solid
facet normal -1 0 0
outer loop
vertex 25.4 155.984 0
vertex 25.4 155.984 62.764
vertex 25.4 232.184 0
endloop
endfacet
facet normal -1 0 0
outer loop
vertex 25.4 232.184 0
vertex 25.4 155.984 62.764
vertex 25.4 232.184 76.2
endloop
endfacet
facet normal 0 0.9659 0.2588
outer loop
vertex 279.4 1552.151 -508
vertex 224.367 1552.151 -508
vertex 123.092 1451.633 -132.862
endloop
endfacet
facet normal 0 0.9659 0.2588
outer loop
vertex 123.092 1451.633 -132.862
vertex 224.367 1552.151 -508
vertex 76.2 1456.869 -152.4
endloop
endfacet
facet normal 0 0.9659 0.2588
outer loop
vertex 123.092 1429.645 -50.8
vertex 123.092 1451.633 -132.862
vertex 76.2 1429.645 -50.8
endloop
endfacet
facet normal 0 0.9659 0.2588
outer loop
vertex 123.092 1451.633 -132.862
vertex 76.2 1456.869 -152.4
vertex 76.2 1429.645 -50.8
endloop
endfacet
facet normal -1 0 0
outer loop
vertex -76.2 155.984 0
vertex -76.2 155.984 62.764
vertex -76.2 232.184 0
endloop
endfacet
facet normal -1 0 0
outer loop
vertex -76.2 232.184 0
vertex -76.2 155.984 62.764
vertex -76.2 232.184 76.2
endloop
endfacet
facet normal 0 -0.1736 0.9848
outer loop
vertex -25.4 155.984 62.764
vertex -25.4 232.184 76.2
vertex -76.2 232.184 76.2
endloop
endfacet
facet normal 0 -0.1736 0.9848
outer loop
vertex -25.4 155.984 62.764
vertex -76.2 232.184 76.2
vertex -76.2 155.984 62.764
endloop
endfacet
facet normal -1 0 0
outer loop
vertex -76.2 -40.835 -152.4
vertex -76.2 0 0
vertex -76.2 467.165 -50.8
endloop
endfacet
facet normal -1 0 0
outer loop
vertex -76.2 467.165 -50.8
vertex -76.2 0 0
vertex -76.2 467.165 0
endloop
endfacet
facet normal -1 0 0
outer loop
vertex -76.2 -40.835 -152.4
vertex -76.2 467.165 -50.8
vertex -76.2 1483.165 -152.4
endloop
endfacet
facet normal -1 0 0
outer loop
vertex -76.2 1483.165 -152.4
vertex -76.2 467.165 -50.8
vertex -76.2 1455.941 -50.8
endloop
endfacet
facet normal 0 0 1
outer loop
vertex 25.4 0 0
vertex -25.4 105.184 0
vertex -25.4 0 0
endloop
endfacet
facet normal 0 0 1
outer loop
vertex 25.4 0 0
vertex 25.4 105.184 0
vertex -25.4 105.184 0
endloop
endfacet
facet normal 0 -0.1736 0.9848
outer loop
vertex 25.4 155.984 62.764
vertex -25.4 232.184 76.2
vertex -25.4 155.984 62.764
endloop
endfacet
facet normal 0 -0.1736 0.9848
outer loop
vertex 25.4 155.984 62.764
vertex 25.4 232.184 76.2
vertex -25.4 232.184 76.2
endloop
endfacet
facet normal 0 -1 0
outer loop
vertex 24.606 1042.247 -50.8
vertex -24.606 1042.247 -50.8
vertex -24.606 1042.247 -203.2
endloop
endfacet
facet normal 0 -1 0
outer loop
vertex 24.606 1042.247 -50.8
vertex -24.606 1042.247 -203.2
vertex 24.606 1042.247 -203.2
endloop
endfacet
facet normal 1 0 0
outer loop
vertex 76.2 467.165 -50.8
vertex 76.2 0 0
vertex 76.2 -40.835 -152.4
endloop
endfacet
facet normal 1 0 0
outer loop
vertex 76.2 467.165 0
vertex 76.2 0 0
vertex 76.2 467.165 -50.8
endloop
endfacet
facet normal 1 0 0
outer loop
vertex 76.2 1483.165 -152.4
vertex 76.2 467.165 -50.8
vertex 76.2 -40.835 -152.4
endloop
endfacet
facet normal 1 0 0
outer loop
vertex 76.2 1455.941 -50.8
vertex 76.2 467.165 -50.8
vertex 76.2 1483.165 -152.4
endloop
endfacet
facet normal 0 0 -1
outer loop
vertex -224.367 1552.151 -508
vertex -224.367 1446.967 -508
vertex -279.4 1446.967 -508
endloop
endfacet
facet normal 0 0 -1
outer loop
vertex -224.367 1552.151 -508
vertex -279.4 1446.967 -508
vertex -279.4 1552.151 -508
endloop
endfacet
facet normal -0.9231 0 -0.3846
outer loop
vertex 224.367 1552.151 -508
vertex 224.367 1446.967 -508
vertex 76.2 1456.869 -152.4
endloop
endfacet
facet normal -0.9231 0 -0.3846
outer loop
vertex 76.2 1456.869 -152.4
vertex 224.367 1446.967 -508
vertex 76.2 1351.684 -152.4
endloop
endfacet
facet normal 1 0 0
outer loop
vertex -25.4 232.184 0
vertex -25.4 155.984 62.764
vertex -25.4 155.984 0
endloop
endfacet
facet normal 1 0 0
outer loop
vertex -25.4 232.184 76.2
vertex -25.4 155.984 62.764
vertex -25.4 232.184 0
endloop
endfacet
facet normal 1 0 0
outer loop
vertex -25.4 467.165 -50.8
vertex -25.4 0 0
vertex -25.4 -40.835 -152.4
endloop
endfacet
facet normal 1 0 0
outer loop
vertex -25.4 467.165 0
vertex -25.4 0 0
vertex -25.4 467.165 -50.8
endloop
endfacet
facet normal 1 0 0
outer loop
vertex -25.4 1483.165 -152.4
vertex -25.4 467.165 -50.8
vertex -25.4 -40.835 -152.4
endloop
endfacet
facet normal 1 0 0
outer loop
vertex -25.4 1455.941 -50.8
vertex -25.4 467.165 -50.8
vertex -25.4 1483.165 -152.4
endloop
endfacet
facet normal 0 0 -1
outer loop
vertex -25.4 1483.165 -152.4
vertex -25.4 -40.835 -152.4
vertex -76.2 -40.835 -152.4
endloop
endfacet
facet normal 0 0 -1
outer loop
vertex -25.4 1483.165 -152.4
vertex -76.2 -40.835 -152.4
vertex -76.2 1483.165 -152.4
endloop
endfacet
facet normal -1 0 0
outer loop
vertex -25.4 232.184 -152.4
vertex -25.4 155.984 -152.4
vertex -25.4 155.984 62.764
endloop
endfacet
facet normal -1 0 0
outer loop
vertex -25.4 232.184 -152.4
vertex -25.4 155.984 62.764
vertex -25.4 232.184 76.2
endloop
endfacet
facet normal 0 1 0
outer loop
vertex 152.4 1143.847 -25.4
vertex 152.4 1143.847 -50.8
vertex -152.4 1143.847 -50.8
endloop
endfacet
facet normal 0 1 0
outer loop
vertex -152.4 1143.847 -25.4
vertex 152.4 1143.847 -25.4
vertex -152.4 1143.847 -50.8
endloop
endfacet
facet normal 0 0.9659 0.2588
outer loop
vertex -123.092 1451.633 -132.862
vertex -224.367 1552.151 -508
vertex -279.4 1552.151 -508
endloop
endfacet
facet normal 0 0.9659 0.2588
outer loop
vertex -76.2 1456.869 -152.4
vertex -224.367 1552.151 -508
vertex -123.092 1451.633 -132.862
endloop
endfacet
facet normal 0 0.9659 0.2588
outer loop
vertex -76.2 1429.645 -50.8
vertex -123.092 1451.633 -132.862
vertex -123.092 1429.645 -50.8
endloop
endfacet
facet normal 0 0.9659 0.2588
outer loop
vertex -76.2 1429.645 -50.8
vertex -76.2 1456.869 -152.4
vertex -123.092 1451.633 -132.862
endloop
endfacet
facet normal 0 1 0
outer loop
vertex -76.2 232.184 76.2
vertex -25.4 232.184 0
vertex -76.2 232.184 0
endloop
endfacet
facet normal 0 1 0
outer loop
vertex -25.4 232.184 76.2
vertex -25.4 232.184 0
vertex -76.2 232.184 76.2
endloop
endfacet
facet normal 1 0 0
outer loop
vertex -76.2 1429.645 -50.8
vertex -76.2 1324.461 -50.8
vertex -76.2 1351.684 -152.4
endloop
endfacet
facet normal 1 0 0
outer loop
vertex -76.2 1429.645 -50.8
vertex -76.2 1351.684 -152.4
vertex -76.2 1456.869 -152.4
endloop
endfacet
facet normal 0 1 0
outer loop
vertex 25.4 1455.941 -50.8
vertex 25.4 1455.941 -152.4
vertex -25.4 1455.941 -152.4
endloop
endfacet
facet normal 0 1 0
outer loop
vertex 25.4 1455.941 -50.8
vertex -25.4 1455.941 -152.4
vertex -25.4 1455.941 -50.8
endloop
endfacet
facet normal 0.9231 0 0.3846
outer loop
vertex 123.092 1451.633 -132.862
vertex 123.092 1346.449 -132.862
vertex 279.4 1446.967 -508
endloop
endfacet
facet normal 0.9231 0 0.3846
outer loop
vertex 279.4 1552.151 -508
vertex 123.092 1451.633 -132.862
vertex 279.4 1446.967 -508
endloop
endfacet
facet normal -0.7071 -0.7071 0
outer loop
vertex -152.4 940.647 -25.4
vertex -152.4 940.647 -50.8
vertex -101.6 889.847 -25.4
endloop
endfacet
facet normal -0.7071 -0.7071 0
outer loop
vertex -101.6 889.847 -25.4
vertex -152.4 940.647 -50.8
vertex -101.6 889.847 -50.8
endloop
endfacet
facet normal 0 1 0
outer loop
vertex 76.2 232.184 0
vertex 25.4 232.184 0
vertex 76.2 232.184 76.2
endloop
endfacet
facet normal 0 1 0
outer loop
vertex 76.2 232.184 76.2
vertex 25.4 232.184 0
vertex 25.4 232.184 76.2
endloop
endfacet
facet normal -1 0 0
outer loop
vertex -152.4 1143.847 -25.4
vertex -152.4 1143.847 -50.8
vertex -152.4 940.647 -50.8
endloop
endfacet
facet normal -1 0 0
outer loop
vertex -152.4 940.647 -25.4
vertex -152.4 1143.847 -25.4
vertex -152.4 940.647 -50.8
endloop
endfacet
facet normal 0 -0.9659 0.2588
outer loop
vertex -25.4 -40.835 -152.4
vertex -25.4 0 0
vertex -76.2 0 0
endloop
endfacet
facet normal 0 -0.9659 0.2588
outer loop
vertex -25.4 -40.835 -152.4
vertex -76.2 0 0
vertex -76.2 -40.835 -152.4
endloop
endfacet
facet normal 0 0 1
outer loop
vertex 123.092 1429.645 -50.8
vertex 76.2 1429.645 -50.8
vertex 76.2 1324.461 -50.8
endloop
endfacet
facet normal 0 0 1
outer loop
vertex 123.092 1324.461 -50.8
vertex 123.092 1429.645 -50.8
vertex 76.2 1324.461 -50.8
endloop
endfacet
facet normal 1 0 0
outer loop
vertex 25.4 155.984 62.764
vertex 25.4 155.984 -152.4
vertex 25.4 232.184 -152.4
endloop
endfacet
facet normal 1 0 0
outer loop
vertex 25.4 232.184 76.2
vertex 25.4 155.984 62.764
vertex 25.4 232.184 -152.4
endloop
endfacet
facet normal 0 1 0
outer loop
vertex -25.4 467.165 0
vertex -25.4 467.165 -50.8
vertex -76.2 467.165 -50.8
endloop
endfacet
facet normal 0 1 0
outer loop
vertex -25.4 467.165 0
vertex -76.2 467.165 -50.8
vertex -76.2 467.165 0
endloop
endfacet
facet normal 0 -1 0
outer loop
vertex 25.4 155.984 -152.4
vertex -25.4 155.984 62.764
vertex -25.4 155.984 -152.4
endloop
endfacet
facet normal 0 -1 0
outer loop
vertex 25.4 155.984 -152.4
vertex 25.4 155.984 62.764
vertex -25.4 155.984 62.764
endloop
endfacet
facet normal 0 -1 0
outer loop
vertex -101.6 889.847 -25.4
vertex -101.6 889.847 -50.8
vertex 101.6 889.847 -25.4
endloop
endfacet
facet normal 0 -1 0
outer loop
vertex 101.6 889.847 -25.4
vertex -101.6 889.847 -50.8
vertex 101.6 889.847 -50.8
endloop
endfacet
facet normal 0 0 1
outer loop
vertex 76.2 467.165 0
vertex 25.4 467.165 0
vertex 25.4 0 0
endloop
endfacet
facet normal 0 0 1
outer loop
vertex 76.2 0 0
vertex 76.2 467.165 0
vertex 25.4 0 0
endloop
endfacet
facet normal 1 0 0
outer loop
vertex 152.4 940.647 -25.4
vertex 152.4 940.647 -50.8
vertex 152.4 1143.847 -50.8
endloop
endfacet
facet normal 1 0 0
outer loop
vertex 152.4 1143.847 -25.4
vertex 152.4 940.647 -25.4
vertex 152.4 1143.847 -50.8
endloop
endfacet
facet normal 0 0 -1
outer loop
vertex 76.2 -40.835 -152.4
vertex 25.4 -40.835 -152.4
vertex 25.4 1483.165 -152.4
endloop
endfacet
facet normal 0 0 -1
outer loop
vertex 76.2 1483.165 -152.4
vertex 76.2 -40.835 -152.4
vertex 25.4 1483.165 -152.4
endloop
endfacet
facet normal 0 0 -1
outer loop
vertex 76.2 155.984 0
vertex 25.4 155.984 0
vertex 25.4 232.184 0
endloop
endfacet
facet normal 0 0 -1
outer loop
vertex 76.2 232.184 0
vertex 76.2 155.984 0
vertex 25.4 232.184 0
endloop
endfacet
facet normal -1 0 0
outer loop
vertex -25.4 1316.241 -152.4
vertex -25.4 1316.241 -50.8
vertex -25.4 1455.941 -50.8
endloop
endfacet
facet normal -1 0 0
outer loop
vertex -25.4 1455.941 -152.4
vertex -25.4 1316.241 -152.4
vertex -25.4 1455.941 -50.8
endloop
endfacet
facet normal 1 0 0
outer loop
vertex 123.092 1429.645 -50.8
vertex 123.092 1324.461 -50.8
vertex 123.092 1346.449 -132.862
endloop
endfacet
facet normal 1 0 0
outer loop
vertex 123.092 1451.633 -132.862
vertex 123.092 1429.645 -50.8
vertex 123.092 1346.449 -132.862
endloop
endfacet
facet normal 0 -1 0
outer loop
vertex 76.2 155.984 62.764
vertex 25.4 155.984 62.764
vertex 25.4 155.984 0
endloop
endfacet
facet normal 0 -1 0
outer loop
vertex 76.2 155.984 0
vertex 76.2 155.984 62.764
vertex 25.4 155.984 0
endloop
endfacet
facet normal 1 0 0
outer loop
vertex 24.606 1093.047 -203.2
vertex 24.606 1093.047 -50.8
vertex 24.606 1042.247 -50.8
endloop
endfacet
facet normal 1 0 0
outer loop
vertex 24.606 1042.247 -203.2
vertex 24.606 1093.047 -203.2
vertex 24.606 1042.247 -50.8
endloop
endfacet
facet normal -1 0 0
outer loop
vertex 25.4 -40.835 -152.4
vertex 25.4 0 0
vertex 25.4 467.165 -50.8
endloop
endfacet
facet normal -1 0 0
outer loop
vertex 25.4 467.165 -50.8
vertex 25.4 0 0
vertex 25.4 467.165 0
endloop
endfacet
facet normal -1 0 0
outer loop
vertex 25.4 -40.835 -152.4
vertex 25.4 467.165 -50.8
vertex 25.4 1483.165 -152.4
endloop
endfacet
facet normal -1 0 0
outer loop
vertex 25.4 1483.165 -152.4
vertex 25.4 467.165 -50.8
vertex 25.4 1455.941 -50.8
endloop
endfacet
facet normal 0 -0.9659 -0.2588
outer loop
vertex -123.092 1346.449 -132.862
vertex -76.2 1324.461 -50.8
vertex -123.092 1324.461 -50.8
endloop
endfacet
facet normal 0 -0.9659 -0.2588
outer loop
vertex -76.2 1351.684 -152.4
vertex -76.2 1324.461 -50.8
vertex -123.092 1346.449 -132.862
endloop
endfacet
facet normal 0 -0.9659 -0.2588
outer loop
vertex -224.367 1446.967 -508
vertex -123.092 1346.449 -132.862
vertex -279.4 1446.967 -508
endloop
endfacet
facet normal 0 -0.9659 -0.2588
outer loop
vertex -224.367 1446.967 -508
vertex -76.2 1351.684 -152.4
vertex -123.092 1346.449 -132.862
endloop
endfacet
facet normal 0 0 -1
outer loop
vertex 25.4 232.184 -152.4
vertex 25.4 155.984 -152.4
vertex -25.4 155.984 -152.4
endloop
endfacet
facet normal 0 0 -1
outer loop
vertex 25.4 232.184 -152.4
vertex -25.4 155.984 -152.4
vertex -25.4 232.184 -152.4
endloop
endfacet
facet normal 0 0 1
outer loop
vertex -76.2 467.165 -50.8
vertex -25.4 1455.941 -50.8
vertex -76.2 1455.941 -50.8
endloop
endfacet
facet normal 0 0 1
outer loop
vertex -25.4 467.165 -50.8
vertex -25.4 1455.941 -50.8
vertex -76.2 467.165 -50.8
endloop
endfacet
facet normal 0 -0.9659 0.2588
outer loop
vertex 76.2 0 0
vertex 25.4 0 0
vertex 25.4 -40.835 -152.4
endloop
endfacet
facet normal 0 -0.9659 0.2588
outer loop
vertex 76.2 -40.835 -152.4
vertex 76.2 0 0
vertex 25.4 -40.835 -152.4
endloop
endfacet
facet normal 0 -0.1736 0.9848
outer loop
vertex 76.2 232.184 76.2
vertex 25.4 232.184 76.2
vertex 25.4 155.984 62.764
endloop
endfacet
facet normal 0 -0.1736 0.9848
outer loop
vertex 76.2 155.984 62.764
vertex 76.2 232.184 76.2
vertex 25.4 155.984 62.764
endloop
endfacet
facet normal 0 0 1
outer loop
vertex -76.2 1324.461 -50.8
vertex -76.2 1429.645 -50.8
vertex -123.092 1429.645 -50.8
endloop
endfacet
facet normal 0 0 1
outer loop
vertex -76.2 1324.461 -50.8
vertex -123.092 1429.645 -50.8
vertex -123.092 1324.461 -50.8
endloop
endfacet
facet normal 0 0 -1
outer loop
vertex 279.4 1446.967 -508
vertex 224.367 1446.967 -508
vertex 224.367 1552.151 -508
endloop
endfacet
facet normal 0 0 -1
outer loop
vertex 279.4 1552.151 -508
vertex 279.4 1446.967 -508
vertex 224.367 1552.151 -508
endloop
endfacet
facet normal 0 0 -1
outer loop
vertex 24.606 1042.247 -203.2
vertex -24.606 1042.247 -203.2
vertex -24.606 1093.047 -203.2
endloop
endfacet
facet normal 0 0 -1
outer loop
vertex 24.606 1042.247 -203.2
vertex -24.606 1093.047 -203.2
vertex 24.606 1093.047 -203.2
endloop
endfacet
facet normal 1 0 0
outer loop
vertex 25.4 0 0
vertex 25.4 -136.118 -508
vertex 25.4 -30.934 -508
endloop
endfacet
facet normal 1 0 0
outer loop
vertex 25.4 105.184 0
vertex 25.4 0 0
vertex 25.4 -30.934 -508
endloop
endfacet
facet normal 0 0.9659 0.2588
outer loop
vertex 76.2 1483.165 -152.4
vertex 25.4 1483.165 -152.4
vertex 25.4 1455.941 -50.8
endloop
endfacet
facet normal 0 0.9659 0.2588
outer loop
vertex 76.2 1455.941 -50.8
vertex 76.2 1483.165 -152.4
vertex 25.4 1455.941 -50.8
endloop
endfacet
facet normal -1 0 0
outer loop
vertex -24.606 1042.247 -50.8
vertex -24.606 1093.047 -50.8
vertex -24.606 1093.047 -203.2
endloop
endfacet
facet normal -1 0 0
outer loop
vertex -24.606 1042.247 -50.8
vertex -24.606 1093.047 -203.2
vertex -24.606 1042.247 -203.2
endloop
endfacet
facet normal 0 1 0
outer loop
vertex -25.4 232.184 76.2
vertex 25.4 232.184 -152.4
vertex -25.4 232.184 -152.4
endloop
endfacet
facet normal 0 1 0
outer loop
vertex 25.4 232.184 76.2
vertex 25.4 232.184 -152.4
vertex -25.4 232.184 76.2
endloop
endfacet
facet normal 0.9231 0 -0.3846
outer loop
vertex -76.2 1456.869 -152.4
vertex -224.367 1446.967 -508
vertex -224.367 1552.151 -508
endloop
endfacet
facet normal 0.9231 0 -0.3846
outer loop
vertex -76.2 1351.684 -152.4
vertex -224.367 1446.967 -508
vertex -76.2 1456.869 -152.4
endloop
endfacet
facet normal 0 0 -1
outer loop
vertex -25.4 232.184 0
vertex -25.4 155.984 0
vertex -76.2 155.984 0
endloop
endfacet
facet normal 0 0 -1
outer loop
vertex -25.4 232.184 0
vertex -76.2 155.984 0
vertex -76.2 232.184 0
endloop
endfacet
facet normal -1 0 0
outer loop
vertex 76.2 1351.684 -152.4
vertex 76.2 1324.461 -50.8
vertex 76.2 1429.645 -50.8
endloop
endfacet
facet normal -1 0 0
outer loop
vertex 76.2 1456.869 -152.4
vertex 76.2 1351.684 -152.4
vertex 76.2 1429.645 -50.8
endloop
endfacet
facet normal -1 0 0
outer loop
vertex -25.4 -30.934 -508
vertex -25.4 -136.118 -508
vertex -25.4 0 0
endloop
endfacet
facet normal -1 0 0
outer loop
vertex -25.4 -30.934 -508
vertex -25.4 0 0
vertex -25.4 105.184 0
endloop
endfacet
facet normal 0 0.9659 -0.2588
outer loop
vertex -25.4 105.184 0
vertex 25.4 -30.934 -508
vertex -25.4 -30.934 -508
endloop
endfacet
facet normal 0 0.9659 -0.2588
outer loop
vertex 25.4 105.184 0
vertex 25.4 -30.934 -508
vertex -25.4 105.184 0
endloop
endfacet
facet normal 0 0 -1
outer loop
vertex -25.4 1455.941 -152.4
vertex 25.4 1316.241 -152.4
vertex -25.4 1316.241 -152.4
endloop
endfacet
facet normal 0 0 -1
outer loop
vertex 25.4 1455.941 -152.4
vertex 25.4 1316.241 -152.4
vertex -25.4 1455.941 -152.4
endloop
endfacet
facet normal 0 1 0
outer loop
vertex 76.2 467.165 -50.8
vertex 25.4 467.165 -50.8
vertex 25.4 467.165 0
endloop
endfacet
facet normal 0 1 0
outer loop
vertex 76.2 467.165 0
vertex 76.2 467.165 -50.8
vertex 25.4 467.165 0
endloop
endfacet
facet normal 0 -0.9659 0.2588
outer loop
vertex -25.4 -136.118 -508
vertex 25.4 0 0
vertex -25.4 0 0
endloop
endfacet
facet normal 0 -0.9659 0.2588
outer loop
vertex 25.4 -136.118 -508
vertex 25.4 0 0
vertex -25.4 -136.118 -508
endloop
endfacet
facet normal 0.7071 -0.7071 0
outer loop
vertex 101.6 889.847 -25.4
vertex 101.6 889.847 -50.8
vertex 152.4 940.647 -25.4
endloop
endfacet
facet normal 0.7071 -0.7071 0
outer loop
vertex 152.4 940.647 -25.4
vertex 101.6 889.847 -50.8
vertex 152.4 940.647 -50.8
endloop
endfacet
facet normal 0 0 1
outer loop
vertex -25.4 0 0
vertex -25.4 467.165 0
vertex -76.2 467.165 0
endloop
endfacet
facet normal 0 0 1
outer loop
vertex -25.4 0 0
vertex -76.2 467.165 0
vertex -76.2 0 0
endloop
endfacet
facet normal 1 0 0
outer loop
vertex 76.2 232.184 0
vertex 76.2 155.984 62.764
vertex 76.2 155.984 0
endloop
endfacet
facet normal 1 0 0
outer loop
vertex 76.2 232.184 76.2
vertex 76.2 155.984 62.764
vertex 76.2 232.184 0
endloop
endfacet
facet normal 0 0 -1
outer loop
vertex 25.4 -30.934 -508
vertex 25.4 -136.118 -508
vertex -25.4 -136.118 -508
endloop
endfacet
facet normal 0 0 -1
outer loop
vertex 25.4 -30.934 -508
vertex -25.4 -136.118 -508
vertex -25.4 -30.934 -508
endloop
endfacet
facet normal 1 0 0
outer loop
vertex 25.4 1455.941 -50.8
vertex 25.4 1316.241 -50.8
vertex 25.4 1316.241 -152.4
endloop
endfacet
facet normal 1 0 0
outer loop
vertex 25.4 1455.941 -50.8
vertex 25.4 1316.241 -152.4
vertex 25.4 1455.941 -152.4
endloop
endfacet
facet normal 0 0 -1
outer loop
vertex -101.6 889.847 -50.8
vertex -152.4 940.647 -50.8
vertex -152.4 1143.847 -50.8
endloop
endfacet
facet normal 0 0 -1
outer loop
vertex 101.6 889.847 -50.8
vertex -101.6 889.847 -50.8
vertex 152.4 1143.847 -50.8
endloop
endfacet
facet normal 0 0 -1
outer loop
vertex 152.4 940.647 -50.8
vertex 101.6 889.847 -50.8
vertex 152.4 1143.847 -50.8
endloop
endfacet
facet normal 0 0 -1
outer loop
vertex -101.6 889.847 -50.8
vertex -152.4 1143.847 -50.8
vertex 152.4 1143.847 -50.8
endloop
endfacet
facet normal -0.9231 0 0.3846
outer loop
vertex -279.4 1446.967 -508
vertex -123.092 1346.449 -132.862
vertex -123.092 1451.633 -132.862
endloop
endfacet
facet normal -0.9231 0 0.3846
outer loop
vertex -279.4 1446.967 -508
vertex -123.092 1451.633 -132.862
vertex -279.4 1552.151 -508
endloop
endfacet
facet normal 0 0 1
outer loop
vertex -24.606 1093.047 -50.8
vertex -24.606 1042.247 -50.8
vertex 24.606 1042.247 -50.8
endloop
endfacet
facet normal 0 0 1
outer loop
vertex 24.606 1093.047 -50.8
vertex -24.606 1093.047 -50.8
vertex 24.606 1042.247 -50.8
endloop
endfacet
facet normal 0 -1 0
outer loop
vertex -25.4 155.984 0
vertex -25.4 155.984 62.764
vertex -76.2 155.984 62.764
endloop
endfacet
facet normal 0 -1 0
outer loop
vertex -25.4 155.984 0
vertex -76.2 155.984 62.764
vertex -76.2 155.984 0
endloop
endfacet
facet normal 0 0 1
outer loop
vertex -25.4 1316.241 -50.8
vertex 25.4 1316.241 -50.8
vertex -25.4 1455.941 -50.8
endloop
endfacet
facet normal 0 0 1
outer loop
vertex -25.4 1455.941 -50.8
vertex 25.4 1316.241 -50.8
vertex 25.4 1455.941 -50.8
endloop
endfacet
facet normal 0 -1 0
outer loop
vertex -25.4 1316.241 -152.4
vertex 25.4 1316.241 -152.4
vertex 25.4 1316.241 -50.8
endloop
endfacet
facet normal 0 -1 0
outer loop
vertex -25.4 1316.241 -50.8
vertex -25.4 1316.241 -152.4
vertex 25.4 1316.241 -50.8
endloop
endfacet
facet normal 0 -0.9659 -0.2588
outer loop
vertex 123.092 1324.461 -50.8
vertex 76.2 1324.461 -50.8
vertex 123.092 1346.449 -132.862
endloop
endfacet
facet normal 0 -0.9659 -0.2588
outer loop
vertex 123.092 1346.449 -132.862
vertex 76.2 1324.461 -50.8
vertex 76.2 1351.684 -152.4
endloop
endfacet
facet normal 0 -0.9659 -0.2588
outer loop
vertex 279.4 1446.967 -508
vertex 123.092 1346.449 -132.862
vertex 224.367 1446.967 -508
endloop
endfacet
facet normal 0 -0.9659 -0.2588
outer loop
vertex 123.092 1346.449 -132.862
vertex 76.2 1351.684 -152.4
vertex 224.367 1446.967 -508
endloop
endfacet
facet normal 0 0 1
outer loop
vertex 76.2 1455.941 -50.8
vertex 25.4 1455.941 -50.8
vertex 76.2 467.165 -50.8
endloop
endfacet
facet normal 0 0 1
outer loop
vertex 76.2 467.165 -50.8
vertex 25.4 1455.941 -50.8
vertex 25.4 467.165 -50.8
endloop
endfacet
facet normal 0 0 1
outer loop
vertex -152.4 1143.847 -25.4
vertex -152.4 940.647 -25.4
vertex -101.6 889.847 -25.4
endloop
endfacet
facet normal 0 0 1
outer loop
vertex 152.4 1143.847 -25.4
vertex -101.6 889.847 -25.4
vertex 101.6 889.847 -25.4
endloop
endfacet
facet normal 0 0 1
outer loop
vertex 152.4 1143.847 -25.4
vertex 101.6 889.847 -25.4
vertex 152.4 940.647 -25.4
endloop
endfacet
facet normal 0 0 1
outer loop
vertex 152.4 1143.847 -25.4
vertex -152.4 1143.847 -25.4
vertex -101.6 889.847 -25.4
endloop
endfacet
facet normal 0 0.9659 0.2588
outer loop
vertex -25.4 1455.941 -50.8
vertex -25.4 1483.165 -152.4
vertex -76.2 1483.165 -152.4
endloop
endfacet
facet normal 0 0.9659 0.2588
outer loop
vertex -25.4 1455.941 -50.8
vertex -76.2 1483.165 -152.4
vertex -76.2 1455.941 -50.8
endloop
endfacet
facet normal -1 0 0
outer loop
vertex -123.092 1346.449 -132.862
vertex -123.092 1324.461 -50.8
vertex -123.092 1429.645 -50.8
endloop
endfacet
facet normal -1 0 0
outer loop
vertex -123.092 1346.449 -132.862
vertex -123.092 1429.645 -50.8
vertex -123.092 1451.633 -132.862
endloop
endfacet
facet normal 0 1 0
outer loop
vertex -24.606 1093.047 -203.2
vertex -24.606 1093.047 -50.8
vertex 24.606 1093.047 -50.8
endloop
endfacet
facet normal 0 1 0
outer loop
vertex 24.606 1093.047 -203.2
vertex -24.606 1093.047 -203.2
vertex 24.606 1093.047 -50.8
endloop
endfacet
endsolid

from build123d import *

# Parameters (mm, degrees)
F2_DEPTH  = 50.8
F4_DEPTH  = 25.4
F6_DEPTH  = 203.2
F8_DEPTH  = 1552.1522609196
F10_W     = 139.7
F10_H     = 101.6
F11_DEPTH = 25.4
F13_DEPTH = 25.4
F14_W     = 49.2125
F14_H     = 50.8
F15_DEPTH = 152.4
F17_DEPTH = 25.4
F19_DEPTH = 50.8


with BuildPart() as f2:
    # F1 (on offset) → F2 (new body)
    with BuildSketch(Plane.YZ.offset(25.4)):
        Polygon((467.1645430735, 0), (0, 0), (-40.8354569265, -152.4), (1483.1645430735, -152.4), (1455.9409051225, -50.8), (467.1645430735, -50.8), align=None)
    extrude(amount=F2_DEPTH)


with BuildPart() as f4:
    # F3 (on Right) → F4 (new body, symmetric)
    with BuildSketch(Plane.YZ):
        Polygon((105.1840599297, 0), (0, 0), (-136.118189755, -508), (-30.9341298253, -508), align=None)
    extrude(amount=F4_DEPTH, both=True)


with BuildPart() as f6:
    # F5 (on face) → F6 (new body)
    with BuildSketch(Plane.YZ.offset(76.2)):
        Polygon((1429.6448901401, -50.8), (1324.4608302104, -50.8), (1446.9672009899, -508), (1552.1512609196, -508), align=None)
    extrude(amount=F6_DEPTH)

    # F7 (on Front) → F8 (cut, through all)
    with BuildSketch(Plane.XZ):
        Polygon((224.3666666667, -508), (76.2, -152.4), (76.2, -508), align=None)
        Polygon((123.0923076923, -132.8615384615), (279.4, -508), (279.4, -50.8), (123.0923076923, -50.8), align=None)
    extrude(amount=-F8_DEPTH, mode=Mode.SUBTRACT)


with BuildPart() as f9_1:
    # F9: instance of F2
    add(f2.part.mirror(Plane.YZ))


with BuildPart() as f9_2:
    # F9: instance of F6
    add(f6.part.mirror(Plane.YZ))


with BuildPart() as f11:
    # F10 (on Right) → F11 (new body, symmetric)
    with BuildSketch(Plane.YZ):
        with Locations((1386.0909051225, -101.6)):
            Rectangle(F10_W, F10_H)
    extrude(amount=F11_DEPTH, both=True)


with BuildPart() as f13:
    # F12 (on face) → F13 (new body)
    with BuildSketch(Plane.XY.offset(-50.8)):
        Polygon((152.4, 1143.846988678), (0, 1143.846988678), (-152.4, 1143.846988678), (-152.4, 940.646988678), (-101.6, 889.846988678), (0, 889.846988678), (101.6, 889.846988678), (152.4, 940.646988678), align=None)
    extrude(amount=F13_DEPTH)


with BuildPart() as f15:
    # F14 (on face) → F15 (new body)
    with BuildSketch(Plane(origin=(0, 0, -50.8), x_dir=(1, 0, 0), z_dir=(0, 0, -1))):
        with Locations((0, -1067.646988678)):
            Rectangle(F14_W, F14_H)
    extrude(amount=F15_DEPTH)


with BuildPart() as f17:
    # F16 (on Right) → F17 (new body, symmetric)
    with BuildSketch(Plane.YZ):
        Polygon((155.9840599297, 62.76388407), (155.9840599297, -152.4), (232.1840599297, -152.4), (232.1840599297, 76.2), align=None)
    extrude(amount=F17_DEPTH, both=True)


with BuildPart() as f19:
    # F18 (on face) → F19 (new body)
    with BuildSketch(Plane.YZ.offset(25.4)):
        Polygon((232.1840599297, 0), (232.1840599297, 76.2), (155.9840599297, 62.76388407), (155.9840599297, 0), align=None)
    extrude(amount=F19_DEPTH)


with BuildPart() as f20_1:
    # F20: instance of F19
    add(f19.part.mirror(Plane.YZ))


solid = Compound([f2.part, f4.part, f6.part, f9_1.part, f9_2.part, f11.part, f13.part, f15.part, f17.part, f19.part, f20_1.part])
